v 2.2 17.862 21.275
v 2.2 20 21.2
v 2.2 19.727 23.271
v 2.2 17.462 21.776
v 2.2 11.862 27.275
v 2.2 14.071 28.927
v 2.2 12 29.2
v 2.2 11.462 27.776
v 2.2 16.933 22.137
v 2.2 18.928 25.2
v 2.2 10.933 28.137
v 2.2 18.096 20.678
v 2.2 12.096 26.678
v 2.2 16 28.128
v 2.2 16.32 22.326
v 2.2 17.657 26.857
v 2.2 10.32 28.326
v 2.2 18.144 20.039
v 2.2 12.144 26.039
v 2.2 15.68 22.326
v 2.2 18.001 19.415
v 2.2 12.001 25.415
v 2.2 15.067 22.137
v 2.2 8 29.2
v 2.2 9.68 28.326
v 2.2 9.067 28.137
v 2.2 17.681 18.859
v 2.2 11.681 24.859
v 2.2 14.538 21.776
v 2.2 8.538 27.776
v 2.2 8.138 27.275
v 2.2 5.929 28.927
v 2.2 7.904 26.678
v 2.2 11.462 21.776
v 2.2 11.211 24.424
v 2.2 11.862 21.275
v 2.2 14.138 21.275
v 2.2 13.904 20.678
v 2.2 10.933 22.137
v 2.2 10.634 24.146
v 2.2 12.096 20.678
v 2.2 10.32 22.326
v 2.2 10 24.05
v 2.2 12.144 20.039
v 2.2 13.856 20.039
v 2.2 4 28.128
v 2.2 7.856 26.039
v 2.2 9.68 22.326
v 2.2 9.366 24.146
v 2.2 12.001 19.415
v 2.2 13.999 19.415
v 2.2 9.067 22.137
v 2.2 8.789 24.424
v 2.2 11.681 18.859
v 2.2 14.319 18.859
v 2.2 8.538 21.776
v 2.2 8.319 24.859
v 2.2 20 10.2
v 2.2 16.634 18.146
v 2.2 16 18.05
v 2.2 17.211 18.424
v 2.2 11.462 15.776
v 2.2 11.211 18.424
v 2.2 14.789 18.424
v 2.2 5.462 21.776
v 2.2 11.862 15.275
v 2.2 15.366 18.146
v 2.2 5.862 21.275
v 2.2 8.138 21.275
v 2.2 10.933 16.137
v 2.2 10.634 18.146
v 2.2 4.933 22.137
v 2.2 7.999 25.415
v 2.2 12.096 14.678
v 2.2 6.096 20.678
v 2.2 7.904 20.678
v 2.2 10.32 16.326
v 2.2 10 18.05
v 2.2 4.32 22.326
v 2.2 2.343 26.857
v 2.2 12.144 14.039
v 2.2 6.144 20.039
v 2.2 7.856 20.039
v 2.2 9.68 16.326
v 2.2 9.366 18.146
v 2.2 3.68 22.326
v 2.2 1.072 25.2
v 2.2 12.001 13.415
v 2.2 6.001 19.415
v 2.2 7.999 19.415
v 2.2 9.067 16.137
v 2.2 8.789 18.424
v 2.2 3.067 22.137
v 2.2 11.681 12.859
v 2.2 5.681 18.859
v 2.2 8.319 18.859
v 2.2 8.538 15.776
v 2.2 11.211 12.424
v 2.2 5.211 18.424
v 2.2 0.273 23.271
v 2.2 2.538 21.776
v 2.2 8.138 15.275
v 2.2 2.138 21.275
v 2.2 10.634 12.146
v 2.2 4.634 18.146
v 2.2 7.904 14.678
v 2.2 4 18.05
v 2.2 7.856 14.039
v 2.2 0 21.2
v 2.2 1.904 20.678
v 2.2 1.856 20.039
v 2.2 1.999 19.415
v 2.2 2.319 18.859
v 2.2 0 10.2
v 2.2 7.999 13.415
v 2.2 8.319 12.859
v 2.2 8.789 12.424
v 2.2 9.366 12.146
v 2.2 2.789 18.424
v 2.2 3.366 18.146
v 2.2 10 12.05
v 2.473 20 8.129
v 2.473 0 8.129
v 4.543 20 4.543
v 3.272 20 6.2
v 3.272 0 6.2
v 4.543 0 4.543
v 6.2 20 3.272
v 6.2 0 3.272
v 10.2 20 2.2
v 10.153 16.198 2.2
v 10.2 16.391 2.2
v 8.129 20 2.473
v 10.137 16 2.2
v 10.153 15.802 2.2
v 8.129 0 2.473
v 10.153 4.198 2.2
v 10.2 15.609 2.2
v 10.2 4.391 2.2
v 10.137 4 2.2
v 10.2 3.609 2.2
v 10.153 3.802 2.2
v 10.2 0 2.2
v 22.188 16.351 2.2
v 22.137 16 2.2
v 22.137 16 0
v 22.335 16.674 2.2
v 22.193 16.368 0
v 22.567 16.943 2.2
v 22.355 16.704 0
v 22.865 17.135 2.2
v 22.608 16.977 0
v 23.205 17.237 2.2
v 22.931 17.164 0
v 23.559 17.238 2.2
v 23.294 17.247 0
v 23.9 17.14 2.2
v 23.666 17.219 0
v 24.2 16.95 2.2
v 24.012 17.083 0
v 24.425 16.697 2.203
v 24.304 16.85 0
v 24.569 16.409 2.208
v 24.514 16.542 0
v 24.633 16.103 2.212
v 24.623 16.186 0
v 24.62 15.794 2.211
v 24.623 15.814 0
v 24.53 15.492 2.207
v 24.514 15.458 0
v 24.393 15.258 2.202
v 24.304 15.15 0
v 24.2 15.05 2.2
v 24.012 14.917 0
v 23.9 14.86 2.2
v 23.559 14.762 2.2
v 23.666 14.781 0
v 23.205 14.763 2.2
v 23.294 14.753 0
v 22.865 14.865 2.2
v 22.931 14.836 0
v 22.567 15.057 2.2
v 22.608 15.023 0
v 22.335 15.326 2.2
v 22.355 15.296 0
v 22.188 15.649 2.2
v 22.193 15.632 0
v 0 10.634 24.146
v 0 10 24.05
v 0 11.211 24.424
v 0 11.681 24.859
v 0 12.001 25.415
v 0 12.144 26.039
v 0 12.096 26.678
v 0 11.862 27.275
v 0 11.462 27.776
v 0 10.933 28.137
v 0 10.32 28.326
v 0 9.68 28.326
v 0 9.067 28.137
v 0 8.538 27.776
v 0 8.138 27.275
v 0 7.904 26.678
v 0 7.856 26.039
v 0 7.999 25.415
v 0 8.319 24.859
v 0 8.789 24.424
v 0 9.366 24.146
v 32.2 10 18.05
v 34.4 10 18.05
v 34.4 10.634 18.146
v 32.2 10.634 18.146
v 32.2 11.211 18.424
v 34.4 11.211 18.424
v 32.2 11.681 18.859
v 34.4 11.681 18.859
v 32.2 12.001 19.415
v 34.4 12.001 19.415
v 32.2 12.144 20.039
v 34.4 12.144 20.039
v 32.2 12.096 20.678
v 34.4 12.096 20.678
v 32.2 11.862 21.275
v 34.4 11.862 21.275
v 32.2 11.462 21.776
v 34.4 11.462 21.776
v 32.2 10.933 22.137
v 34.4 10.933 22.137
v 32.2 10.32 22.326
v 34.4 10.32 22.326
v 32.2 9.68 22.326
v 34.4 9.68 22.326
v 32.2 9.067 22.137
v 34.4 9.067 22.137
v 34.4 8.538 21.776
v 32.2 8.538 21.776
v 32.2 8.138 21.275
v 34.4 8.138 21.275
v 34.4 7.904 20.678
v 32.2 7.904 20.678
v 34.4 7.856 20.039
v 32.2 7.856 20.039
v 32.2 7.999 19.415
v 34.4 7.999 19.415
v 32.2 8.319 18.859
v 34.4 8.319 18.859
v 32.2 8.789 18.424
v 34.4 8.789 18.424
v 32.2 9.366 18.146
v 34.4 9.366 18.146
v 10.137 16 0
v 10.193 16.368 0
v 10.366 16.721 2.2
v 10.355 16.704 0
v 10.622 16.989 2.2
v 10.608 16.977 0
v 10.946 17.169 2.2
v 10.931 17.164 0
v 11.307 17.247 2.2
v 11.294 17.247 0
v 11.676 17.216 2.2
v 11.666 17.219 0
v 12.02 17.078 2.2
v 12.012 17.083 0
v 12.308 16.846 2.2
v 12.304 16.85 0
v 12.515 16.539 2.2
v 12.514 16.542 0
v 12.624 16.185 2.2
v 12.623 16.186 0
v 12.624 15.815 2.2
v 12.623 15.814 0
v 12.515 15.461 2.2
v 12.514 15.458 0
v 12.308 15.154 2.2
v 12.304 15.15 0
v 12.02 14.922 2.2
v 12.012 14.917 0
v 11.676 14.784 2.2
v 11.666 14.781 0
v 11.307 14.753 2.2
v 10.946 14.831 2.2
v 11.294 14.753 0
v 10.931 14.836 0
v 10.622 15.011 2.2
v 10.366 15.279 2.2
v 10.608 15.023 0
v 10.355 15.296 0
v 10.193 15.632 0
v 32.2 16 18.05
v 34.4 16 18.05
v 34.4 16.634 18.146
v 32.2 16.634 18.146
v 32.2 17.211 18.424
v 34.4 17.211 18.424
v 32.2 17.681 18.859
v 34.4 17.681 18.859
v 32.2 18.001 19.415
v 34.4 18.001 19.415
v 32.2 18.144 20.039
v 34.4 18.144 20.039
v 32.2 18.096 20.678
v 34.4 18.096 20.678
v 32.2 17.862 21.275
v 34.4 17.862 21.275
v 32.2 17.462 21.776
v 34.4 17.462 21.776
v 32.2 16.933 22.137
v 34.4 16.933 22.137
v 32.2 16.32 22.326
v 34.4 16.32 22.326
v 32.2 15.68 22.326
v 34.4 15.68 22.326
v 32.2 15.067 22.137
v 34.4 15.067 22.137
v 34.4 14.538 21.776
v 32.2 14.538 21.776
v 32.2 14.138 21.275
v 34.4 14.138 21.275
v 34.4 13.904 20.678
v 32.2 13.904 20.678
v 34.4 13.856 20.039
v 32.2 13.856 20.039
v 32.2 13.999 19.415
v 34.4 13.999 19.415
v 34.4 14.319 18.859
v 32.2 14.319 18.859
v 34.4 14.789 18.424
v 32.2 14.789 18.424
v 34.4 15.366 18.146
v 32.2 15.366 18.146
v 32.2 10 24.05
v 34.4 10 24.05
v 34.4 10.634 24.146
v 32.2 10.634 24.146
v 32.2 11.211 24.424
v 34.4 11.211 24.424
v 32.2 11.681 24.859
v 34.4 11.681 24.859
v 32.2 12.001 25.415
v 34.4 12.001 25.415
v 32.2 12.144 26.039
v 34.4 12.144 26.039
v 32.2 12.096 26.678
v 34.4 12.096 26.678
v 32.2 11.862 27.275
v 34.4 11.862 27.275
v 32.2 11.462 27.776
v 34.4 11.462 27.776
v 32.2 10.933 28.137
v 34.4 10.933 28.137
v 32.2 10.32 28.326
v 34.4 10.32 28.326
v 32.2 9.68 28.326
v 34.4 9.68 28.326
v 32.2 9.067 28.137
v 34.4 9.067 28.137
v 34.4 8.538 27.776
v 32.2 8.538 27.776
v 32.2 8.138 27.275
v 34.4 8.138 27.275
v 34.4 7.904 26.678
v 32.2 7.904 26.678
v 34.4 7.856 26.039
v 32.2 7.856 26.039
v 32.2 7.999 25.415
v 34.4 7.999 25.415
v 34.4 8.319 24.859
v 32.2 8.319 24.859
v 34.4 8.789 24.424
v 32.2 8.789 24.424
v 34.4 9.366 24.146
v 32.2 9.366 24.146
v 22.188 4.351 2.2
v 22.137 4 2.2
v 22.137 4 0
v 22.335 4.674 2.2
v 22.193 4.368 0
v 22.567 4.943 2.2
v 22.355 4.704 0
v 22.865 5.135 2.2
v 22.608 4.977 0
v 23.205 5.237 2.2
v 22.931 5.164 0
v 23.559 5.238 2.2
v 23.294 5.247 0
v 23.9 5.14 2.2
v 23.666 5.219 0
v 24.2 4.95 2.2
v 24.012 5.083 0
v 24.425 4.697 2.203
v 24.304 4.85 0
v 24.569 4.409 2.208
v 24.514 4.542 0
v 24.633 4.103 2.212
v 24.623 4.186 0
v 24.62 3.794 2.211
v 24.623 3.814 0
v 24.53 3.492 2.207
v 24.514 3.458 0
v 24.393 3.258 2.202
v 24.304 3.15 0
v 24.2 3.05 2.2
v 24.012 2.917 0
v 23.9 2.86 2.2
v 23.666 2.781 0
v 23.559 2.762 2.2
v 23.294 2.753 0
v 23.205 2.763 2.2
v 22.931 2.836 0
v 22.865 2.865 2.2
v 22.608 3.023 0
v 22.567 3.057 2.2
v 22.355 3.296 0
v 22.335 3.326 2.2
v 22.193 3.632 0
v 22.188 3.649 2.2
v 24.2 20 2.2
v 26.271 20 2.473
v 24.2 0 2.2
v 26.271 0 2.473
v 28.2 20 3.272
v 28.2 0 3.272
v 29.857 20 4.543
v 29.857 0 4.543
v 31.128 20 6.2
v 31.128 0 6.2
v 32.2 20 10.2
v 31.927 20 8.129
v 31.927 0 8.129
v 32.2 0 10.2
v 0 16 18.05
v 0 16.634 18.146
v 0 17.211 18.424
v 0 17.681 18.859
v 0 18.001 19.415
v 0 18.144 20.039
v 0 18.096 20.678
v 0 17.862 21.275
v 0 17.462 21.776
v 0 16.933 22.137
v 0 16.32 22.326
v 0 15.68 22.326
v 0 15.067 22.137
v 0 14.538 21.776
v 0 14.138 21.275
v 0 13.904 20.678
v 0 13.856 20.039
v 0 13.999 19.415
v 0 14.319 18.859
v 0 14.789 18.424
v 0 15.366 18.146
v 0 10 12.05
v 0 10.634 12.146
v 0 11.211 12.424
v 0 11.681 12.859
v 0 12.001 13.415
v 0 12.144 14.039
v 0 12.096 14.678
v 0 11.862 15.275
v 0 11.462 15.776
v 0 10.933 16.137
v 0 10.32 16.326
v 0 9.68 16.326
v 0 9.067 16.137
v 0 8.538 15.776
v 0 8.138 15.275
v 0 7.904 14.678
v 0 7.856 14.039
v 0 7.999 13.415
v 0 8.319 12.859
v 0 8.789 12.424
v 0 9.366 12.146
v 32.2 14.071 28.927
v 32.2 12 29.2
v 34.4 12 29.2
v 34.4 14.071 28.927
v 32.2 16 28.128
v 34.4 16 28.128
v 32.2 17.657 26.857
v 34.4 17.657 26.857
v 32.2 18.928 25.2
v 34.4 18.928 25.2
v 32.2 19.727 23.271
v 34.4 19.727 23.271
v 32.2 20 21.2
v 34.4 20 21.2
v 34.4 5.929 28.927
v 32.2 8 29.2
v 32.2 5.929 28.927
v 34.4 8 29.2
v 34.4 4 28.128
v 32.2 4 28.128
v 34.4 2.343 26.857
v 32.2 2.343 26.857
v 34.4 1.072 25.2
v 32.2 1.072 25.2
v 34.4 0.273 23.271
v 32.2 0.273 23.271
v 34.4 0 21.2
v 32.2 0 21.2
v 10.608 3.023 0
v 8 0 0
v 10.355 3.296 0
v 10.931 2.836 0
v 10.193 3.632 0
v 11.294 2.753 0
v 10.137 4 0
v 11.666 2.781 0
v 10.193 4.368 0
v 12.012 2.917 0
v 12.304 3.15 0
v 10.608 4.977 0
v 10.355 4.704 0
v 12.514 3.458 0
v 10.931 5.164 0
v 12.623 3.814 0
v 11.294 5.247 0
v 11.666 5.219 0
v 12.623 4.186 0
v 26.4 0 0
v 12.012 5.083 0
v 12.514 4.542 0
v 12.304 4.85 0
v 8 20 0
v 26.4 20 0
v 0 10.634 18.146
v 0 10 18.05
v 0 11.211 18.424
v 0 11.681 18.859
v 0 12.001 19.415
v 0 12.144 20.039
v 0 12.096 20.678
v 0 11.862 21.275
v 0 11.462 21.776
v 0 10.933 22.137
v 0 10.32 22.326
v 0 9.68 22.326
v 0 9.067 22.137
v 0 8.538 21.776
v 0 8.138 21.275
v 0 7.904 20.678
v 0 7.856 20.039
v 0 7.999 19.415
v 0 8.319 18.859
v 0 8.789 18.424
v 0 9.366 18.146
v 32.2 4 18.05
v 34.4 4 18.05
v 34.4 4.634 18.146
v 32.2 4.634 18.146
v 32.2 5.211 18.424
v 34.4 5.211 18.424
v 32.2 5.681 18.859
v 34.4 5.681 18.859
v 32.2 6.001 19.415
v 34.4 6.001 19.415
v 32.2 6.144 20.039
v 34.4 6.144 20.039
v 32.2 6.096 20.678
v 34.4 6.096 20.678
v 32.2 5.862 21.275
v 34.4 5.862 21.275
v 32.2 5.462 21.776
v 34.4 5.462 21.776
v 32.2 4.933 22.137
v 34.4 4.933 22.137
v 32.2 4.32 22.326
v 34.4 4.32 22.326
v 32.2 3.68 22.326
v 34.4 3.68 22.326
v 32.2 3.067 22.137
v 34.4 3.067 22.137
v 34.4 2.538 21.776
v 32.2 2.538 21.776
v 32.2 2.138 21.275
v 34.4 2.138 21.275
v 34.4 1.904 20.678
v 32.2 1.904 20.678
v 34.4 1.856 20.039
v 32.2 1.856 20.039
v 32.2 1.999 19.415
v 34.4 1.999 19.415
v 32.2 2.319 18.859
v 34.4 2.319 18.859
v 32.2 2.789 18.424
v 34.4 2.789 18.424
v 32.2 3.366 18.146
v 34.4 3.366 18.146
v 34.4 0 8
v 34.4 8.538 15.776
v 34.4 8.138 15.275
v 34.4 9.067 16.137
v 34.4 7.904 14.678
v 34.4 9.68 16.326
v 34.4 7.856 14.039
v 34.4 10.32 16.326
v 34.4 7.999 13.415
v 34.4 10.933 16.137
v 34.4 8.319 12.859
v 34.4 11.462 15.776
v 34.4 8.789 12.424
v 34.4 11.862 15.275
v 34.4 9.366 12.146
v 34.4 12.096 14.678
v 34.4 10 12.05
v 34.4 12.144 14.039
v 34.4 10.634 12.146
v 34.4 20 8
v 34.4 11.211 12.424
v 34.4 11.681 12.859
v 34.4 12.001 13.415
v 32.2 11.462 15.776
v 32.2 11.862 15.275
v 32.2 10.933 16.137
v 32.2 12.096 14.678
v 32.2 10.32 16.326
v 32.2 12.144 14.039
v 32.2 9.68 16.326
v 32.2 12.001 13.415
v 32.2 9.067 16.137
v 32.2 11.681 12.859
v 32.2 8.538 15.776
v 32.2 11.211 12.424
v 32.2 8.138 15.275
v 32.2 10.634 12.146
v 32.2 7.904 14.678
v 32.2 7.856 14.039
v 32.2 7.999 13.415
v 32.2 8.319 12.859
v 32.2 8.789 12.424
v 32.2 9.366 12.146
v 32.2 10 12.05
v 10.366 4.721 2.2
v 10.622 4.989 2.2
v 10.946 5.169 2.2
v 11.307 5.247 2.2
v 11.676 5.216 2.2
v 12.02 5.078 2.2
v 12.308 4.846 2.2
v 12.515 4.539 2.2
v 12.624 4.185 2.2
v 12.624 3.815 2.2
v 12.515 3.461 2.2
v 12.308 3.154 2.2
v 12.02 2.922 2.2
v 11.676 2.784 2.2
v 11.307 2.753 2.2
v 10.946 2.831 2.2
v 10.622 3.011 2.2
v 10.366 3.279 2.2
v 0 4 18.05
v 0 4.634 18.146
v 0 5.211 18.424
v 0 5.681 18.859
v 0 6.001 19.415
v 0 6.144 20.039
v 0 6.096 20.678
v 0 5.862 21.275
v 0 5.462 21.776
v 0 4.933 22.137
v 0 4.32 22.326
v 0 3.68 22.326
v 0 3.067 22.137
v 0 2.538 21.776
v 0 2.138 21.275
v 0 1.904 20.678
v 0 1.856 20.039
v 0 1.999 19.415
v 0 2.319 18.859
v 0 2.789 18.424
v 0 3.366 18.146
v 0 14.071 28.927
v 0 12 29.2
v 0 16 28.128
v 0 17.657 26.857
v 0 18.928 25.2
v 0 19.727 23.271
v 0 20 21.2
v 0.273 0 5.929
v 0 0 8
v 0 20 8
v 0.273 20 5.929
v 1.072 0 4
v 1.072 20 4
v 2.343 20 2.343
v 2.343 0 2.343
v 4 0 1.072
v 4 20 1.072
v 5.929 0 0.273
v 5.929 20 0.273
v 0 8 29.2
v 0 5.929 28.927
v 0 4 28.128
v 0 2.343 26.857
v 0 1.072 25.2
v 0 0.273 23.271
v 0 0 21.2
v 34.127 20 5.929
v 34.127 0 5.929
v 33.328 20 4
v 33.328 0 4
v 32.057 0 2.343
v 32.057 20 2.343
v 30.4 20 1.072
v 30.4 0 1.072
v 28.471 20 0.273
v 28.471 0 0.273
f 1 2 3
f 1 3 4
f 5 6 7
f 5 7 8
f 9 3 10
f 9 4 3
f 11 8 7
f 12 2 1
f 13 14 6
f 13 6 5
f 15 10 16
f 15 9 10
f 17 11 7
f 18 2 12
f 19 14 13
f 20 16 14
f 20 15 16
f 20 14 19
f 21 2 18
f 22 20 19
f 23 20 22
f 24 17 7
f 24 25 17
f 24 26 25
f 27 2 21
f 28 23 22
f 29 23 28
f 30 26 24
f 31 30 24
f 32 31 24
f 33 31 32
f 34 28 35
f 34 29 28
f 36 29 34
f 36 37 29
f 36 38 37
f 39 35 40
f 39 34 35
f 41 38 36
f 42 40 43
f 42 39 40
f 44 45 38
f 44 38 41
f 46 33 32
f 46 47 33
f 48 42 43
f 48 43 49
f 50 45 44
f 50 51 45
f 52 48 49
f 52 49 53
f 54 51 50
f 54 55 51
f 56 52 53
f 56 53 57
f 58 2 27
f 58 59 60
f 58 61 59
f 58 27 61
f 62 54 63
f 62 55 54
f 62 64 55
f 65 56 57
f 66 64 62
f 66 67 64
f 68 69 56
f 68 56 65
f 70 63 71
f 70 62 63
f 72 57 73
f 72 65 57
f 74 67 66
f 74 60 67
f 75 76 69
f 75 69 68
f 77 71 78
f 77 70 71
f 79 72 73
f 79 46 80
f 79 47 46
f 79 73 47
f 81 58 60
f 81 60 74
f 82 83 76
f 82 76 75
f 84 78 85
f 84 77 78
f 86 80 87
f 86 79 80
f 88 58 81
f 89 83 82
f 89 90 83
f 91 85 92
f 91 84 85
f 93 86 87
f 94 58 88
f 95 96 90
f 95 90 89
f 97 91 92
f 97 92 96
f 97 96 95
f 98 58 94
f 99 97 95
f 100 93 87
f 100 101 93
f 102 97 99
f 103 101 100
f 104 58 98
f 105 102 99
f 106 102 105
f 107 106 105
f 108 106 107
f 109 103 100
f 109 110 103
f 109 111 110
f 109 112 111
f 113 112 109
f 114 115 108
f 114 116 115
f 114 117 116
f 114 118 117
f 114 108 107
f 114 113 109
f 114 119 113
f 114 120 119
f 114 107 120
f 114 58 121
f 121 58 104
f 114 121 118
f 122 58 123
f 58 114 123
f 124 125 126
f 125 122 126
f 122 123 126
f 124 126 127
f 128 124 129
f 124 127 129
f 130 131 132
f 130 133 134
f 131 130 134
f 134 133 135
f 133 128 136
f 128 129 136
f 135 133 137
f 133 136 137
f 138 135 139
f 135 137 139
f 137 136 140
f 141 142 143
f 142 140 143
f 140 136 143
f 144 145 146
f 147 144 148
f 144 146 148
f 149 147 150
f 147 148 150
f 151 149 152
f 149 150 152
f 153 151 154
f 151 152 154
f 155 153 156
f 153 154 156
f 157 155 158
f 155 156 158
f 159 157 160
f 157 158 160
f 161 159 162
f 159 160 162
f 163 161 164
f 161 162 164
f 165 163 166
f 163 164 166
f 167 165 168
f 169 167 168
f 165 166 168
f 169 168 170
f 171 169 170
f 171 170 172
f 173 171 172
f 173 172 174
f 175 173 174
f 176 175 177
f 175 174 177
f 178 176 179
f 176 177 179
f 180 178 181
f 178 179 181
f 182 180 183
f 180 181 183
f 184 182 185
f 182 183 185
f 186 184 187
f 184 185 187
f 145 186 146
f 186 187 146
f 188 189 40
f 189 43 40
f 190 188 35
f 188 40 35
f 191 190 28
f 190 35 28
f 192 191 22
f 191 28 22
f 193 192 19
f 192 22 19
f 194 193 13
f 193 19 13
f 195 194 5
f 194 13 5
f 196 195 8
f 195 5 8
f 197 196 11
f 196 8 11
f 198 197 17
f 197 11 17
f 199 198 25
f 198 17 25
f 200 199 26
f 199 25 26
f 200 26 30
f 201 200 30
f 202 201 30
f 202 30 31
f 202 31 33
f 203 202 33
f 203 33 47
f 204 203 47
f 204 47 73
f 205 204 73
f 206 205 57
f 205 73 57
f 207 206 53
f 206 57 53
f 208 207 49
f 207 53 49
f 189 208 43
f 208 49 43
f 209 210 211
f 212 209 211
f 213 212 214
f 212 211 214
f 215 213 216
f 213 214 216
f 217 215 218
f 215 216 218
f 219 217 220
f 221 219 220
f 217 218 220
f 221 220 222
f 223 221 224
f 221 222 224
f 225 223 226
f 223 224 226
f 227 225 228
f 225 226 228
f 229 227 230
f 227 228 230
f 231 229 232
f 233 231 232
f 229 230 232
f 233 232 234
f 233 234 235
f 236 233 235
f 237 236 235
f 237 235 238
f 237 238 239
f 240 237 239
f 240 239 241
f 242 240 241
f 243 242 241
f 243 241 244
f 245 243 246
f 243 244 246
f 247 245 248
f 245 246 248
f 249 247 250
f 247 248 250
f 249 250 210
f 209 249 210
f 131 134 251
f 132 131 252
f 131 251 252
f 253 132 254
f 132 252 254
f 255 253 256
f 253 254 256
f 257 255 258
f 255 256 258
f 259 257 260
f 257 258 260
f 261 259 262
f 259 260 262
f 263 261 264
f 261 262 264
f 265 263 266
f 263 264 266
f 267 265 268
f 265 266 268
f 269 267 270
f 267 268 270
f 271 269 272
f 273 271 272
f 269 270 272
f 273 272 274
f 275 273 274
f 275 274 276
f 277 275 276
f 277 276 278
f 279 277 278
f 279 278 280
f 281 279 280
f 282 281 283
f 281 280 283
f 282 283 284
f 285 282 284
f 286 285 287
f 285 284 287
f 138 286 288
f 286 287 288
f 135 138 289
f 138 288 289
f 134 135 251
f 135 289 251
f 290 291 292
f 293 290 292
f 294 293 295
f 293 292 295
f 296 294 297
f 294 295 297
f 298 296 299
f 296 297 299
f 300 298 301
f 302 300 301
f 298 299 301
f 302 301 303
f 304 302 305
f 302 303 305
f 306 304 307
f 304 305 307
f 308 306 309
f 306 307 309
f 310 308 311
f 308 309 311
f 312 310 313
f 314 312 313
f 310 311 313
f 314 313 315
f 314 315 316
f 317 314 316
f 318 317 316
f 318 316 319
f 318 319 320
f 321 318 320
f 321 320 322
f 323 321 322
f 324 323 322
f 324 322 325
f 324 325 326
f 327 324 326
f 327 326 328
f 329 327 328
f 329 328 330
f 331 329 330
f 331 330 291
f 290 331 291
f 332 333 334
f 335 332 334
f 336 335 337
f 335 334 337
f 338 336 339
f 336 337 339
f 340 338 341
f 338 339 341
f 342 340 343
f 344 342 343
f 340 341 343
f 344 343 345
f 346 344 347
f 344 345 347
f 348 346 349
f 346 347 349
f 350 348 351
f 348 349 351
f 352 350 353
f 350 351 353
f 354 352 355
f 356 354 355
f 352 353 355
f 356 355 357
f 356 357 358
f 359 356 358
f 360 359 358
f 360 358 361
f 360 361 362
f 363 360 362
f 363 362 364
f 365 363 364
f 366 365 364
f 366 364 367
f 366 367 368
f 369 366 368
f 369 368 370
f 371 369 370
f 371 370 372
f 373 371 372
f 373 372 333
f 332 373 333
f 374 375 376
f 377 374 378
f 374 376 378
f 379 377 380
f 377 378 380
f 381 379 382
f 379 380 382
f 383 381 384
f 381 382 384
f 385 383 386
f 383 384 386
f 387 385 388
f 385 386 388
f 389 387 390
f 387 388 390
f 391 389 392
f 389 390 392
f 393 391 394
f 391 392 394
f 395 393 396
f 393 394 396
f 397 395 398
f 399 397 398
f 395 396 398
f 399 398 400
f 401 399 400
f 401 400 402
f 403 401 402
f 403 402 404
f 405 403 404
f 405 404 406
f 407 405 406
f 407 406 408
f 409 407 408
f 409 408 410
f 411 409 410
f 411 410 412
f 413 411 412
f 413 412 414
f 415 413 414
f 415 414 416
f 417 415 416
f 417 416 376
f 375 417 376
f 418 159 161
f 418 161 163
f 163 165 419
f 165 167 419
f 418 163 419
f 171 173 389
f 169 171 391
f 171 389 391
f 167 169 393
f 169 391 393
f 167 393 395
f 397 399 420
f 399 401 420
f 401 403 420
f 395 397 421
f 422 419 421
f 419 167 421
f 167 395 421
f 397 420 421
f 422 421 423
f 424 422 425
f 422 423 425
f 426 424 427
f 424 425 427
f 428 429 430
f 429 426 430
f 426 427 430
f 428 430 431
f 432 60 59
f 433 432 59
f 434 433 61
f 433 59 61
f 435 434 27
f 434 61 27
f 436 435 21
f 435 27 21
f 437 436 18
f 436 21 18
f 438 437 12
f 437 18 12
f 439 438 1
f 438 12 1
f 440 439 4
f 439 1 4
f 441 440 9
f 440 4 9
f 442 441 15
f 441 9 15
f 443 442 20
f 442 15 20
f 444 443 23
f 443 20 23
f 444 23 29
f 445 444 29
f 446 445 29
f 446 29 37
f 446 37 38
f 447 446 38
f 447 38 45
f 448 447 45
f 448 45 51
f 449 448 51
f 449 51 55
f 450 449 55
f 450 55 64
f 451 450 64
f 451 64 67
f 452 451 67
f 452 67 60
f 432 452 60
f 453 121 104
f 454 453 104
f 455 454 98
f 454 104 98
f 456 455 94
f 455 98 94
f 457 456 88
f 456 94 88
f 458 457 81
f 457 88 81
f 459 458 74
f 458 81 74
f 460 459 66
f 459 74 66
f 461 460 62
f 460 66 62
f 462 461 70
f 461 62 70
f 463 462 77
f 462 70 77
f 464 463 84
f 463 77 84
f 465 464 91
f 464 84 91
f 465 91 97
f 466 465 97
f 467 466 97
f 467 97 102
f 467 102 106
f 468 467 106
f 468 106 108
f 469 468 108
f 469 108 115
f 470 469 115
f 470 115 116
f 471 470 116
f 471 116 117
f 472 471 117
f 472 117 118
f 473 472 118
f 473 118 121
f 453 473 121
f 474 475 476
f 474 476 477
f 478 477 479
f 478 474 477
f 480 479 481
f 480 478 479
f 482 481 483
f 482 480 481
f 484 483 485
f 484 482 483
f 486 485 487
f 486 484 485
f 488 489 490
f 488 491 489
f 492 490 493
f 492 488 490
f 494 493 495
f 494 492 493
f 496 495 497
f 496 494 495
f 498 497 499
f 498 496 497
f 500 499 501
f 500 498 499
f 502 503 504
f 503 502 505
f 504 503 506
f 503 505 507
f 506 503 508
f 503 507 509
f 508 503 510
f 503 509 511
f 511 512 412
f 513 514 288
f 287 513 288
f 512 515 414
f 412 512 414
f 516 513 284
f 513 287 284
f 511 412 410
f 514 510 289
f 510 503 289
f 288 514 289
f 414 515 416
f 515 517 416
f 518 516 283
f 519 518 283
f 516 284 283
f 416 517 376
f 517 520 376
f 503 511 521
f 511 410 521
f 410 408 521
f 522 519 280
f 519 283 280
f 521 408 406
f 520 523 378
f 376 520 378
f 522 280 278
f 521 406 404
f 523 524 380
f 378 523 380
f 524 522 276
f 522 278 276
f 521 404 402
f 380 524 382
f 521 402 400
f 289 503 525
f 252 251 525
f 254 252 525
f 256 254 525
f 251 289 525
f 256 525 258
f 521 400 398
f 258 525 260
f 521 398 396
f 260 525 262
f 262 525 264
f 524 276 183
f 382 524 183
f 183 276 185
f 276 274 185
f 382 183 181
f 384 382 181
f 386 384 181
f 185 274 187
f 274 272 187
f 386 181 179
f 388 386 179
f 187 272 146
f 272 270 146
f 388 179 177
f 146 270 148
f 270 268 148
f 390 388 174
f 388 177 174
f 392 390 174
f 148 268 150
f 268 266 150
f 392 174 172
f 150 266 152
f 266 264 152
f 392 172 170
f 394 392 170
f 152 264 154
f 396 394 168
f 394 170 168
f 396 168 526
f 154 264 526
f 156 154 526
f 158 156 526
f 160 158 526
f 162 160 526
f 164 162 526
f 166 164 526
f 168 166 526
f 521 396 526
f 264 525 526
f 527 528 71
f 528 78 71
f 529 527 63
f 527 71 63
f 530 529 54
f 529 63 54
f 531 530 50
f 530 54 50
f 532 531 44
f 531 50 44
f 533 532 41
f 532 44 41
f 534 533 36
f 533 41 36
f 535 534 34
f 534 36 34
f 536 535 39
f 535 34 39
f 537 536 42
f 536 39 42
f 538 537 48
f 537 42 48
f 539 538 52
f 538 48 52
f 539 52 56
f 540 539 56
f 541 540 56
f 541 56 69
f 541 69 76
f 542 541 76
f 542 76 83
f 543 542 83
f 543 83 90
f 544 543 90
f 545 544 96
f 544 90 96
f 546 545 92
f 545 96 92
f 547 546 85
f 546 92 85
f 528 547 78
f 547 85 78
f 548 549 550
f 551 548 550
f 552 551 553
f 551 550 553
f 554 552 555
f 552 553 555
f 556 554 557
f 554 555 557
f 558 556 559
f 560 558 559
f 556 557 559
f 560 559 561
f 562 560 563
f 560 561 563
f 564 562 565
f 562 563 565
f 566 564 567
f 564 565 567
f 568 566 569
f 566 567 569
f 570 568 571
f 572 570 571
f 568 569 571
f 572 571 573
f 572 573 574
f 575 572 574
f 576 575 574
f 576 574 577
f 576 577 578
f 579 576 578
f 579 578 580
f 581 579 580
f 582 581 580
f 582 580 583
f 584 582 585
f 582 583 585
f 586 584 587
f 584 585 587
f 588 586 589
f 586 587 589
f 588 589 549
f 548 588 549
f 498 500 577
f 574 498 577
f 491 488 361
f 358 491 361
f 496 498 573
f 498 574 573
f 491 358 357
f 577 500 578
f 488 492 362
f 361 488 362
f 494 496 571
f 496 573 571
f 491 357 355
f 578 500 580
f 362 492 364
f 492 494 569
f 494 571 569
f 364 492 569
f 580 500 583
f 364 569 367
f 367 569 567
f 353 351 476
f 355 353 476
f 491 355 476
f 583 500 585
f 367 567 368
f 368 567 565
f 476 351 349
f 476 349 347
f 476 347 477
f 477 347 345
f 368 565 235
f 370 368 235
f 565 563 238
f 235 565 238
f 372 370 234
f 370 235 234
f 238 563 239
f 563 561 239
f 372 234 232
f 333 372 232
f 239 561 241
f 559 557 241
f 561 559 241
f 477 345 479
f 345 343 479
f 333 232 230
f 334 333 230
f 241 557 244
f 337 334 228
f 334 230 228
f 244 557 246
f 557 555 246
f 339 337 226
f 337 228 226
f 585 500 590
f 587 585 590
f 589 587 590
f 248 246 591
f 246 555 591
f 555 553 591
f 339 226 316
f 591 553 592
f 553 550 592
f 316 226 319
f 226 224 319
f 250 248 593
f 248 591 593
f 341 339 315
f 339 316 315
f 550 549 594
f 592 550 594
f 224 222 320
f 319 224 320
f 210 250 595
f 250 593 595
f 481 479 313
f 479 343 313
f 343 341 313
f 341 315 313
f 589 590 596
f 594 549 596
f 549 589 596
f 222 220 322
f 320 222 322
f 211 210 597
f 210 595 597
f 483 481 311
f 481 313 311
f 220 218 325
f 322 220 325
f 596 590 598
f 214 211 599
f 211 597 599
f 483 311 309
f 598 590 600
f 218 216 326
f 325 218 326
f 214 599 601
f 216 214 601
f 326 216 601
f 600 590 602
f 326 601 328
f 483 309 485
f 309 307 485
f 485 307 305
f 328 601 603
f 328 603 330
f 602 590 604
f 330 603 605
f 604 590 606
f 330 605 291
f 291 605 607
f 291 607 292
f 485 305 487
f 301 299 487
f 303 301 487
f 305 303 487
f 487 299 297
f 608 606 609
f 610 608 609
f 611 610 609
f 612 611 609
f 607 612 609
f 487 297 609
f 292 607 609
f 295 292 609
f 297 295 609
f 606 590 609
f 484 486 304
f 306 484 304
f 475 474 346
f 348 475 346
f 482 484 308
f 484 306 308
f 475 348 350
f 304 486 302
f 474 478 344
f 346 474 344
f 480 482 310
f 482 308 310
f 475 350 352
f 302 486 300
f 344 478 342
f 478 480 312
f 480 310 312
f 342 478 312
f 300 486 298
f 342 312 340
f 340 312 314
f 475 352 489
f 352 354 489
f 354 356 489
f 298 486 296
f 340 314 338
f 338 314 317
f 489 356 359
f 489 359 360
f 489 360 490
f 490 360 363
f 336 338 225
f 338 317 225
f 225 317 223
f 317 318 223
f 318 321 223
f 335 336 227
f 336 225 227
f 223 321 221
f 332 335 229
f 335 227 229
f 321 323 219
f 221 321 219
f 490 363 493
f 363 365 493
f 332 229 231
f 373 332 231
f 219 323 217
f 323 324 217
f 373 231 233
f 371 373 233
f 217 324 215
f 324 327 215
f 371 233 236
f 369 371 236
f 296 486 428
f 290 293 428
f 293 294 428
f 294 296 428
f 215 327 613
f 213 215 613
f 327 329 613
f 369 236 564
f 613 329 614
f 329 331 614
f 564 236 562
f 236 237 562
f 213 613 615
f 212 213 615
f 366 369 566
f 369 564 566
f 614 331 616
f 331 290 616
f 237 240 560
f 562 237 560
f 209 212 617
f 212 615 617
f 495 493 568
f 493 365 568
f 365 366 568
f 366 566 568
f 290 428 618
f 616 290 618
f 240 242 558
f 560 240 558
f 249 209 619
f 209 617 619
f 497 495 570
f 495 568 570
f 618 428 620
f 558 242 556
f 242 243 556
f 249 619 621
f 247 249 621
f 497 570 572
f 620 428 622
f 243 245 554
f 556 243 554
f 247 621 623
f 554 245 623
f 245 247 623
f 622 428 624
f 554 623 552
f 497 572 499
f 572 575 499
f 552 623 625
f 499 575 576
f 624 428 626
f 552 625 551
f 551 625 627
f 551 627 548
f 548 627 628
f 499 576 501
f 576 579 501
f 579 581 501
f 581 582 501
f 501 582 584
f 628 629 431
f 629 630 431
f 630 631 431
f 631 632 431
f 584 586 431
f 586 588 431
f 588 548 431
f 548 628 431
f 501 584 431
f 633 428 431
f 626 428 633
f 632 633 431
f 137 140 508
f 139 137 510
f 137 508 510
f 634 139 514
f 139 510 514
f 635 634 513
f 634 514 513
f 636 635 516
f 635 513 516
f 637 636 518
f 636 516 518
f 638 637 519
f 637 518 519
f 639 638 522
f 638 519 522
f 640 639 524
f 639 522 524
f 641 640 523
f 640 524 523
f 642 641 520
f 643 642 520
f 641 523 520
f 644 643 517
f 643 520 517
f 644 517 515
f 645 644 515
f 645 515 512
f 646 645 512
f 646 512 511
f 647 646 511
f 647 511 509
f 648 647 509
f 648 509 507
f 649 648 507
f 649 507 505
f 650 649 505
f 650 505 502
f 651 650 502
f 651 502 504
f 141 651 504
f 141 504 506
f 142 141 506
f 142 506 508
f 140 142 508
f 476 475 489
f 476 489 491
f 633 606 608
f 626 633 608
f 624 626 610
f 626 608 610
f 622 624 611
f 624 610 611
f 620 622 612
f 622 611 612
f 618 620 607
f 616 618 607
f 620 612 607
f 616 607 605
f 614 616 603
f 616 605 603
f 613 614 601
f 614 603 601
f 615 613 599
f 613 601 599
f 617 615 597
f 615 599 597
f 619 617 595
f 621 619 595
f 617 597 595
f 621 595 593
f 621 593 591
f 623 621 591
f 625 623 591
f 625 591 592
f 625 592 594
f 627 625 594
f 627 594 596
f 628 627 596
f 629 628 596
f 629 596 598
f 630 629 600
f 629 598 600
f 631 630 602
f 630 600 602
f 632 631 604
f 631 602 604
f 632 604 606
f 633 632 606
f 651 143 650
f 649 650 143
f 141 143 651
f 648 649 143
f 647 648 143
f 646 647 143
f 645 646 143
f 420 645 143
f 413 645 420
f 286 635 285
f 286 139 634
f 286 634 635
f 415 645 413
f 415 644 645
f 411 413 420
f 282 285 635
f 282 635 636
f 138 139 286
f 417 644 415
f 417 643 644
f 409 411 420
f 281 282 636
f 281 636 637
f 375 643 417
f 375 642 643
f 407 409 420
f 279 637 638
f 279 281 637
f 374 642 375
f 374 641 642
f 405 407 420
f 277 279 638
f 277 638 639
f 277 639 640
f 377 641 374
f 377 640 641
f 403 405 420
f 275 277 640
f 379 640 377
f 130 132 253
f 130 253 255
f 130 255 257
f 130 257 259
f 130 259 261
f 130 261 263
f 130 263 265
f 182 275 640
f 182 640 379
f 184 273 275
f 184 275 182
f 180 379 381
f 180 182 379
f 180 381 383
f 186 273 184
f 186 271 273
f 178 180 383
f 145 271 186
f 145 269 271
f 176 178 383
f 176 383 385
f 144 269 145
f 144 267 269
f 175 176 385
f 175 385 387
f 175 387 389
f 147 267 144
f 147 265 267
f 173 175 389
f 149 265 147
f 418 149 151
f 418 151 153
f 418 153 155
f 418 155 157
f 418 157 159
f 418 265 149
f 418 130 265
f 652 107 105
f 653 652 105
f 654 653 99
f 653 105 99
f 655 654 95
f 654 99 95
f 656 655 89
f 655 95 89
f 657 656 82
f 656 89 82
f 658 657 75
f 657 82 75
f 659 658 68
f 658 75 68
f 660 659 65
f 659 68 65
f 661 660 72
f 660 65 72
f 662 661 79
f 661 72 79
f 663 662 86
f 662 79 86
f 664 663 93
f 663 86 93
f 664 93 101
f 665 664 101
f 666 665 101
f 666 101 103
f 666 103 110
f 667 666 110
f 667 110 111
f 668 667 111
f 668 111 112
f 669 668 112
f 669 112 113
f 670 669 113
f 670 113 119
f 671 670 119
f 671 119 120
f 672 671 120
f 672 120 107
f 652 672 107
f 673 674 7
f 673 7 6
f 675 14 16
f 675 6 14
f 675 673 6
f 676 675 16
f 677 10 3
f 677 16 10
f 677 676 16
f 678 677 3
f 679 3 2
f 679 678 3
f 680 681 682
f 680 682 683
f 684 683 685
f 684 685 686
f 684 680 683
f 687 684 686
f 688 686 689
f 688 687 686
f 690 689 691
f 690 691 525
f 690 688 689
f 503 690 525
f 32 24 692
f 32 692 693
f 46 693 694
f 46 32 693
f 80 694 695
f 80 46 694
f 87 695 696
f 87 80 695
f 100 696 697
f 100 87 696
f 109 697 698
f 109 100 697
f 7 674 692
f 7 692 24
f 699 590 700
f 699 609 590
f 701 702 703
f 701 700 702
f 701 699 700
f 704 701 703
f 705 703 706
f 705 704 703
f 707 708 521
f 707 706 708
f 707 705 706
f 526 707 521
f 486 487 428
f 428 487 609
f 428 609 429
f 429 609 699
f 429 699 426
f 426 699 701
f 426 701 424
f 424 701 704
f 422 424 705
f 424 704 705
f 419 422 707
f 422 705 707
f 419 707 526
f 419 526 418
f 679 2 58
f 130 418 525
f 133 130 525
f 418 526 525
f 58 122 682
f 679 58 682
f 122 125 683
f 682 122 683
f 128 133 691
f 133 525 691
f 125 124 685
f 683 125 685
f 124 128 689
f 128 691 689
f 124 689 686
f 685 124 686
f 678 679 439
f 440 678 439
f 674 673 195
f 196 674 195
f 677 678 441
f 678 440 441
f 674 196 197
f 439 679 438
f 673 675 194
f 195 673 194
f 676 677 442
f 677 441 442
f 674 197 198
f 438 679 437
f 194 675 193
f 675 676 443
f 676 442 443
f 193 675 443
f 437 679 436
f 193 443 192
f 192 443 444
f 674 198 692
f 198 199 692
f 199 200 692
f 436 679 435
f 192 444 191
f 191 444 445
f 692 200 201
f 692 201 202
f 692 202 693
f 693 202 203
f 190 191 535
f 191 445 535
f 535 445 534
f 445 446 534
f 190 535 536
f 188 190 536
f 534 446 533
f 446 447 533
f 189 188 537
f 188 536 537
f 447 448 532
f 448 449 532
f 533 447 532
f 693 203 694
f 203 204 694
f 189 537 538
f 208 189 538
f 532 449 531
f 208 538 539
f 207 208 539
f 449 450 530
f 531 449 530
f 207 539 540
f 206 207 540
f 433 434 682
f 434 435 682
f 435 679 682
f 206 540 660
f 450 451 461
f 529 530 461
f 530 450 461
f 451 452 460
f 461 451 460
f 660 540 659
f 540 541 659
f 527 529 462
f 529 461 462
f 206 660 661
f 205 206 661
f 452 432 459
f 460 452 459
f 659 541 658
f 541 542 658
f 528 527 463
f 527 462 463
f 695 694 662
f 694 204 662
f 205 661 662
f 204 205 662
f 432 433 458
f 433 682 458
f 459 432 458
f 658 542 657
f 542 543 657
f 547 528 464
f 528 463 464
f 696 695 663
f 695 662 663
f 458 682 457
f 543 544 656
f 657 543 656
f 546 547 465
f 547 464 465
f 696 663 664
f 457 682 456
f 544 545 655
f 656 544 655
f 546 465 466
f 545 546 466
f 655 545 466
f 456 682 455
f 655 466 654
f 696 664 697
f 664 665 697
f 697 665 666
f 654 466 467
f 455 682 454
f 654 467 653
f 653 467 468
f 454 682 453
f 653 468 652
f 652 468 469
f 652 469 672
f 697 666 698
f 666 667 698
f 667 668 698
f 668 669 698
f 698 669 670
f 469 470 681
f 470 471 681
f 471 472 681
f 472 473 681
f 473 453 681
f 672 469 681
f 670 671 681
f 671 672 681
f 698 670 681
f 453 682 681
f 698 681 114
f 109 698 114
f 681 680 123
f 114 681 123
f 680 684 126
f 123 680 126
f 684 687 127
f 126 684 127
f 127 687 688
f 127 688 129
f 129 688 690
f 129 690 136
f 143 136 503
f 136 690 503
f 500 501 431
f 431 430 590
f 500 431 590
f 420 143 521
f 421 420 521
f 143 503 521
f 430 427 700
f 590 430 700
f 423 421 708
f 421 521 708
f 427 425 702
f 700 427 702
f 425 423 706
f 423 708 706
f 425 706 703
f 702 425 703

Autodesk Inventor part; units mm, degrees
ref_plane "YZ Plane" through (0, 0, 0) normal (1, 0, 0) x (0, 1, 0)
ref_plane "XZ Plane" through (0, 0, 0) normal (0, 1, 0) x (-1, 0, 0)
ref_plane "XY Plane" through (0, 0, 0) normal (0, 0, 1) x (1, 0, 0)
sketch "Esquisse1" plane through (0, 0, 0) normal (0, 0, 1) x (1, 0, 0)
  line L0 (0, 0) -> (34.4, 0)
  line L1 (34.4, 0) -> (34.4, 20)
  line L2 (34.4, 20) -> (0, 20)
  line L3 (0, 20) -> (0, 0)
  dimension "d0" = 34.4
  dimension "d1" = 20
extrude "Extrusion1" add sketch "Esquisse1" along normal blind 2.2
sketch "Esquisse2" plane through (0, 0, 2.2) normal (0, 0, 1) x (1, 0, 0)
  line L0 (0, 0) -> (34.4, 0) projected
  line L1 (34.4, 20) -> (0, 20) projected
  line L2 (0, 20) -> (0, 0) projected
  line L3 (0, 20) -> (2.2, 20)
  line L4 (2.2, 20) -> (2.2, 0)
  line L5 (2.2, 0) -> (0, 0)
  line L6 (0, 0) -> (0, 20)
  line L7 (17.2, 20) -> (17.2, 0) construction
  line L8 (34.4, 20) -> (32.2, 20)
  line L9 (32.2, 20) -> (32.2, 0)
  line L10 (32.2, 0) -> (34.4, 0)
  line L11 (34.4, 0) -> (34.4, 20)
  dimension "d4" = 2.2
extrude "Extrusion2" add sketch "Esquisse2" along normal blind 27 contours L2 L1 L4 L0 | L9 L1 L11 L0
sketch "Esquisse3" plane through (34.4, 0, 0) normal (1, 0, 0) x (0, 0, -1)
  line L0 (0, 0) -> (0, 20) construction
  line L1 (-29.2, 0) -> (-29.2, 20) construction
  line L2 (-29.2, 10) -> (0, 10) construction
  circle A0 centre (-20.2, 10) radius 2.15
  line L3 (-20.2, 10) -> (-20.2, 15.2246) construction
  circle A1 centre (-14.2, 10) radius 2.15
  circle A2 centre (-26.2, 10) radius 2.15
  circle A3 centre (-20.2, 10) radius 2.15
  circle A4 centre (-20.2, 16) radius 2.15
  circle A5 centre (-20.2, 4) radius 2.15
  circle A6 centre (-20.2, 10) radius 2.15
  dimension "d7" = 9
  dimension "d8" = 4.3
  dimension "d11" = 6
  dimension "d14" = 6
  dimension "d19" = 6
  dimension "d22" = 6
extrude "Extrusion3" cut sketch "Esquisse3" against normal through all
fillet "Congé1" radius 8 4 edges at (33.3, 20, 29.2) (1.1, 20, 29.2) (1.1, 0, 29.2) (33.3, 0, 29.2)
fillet "Congé2" radius 8 4 edges at (2.2, 10, 2.2) (0, 10, 0) (34.4, 10, 0) (32.2, 10, 2.2)
sketch "Esquisse4" plane through (0, 0, 0) normal (0, 0, -1) x (-1, 0, 0)
  line L0 (-8, 0) -> (-26.4, 0) construction
  line L1 (-26.4, 20) -> (-8.3748, 0) construction
  line L2 (-23.3874, 4) -> (-11.3874, 4) construction
  line L3 (-11.3874, 4) -> (-11.3874, 16) construction
  line L4 (-11.3874, 16) -> (-23.3874, 16) construction
  line L5 (-23.3874, 16) -> (-23.3874, 4) construction
  line L6 (-23.3874, 4) -> (-11.3874, 16) construction
  line L7 (-11.3874, 4) -> (-23.3874, 16) construction
  circle A0 centre (-23.3874, 16) radius 1.25
  line L8 (-17.3874, 16) -> (-17.3874, 4) construction
  line L9 (-23.3874, 10) -> (-11.3874, 10) construction
  circle A1 centre (-11.3874, 16) radius 1.25
  circle A2 centre (-23.3874, 4) radius 1.25
  circle A3 centre (-11.3874, 4) radius 1.25
  point P0 (0, 0)
  point P1 (-17.3874, 10)
  dimension "d29" = 12
  dimension "d30" = 2.5
extrude "Extrusion4" cut sketch "Esquisse4" against normal through all
equation "\"d2\" = UDepth"
equation "\"d4\" = Depth"
equation "\"d8\" = Holes"
equation "\"d28\" = URound"
equation "\"Depth\" = 2.2"
equation "\"Holes\" = 4.3"
equation "\"UDepth\" = Depth"
equation "\"USize\" = 5"
equation "\"URound\" = 8"
properties part number "Ufix"
